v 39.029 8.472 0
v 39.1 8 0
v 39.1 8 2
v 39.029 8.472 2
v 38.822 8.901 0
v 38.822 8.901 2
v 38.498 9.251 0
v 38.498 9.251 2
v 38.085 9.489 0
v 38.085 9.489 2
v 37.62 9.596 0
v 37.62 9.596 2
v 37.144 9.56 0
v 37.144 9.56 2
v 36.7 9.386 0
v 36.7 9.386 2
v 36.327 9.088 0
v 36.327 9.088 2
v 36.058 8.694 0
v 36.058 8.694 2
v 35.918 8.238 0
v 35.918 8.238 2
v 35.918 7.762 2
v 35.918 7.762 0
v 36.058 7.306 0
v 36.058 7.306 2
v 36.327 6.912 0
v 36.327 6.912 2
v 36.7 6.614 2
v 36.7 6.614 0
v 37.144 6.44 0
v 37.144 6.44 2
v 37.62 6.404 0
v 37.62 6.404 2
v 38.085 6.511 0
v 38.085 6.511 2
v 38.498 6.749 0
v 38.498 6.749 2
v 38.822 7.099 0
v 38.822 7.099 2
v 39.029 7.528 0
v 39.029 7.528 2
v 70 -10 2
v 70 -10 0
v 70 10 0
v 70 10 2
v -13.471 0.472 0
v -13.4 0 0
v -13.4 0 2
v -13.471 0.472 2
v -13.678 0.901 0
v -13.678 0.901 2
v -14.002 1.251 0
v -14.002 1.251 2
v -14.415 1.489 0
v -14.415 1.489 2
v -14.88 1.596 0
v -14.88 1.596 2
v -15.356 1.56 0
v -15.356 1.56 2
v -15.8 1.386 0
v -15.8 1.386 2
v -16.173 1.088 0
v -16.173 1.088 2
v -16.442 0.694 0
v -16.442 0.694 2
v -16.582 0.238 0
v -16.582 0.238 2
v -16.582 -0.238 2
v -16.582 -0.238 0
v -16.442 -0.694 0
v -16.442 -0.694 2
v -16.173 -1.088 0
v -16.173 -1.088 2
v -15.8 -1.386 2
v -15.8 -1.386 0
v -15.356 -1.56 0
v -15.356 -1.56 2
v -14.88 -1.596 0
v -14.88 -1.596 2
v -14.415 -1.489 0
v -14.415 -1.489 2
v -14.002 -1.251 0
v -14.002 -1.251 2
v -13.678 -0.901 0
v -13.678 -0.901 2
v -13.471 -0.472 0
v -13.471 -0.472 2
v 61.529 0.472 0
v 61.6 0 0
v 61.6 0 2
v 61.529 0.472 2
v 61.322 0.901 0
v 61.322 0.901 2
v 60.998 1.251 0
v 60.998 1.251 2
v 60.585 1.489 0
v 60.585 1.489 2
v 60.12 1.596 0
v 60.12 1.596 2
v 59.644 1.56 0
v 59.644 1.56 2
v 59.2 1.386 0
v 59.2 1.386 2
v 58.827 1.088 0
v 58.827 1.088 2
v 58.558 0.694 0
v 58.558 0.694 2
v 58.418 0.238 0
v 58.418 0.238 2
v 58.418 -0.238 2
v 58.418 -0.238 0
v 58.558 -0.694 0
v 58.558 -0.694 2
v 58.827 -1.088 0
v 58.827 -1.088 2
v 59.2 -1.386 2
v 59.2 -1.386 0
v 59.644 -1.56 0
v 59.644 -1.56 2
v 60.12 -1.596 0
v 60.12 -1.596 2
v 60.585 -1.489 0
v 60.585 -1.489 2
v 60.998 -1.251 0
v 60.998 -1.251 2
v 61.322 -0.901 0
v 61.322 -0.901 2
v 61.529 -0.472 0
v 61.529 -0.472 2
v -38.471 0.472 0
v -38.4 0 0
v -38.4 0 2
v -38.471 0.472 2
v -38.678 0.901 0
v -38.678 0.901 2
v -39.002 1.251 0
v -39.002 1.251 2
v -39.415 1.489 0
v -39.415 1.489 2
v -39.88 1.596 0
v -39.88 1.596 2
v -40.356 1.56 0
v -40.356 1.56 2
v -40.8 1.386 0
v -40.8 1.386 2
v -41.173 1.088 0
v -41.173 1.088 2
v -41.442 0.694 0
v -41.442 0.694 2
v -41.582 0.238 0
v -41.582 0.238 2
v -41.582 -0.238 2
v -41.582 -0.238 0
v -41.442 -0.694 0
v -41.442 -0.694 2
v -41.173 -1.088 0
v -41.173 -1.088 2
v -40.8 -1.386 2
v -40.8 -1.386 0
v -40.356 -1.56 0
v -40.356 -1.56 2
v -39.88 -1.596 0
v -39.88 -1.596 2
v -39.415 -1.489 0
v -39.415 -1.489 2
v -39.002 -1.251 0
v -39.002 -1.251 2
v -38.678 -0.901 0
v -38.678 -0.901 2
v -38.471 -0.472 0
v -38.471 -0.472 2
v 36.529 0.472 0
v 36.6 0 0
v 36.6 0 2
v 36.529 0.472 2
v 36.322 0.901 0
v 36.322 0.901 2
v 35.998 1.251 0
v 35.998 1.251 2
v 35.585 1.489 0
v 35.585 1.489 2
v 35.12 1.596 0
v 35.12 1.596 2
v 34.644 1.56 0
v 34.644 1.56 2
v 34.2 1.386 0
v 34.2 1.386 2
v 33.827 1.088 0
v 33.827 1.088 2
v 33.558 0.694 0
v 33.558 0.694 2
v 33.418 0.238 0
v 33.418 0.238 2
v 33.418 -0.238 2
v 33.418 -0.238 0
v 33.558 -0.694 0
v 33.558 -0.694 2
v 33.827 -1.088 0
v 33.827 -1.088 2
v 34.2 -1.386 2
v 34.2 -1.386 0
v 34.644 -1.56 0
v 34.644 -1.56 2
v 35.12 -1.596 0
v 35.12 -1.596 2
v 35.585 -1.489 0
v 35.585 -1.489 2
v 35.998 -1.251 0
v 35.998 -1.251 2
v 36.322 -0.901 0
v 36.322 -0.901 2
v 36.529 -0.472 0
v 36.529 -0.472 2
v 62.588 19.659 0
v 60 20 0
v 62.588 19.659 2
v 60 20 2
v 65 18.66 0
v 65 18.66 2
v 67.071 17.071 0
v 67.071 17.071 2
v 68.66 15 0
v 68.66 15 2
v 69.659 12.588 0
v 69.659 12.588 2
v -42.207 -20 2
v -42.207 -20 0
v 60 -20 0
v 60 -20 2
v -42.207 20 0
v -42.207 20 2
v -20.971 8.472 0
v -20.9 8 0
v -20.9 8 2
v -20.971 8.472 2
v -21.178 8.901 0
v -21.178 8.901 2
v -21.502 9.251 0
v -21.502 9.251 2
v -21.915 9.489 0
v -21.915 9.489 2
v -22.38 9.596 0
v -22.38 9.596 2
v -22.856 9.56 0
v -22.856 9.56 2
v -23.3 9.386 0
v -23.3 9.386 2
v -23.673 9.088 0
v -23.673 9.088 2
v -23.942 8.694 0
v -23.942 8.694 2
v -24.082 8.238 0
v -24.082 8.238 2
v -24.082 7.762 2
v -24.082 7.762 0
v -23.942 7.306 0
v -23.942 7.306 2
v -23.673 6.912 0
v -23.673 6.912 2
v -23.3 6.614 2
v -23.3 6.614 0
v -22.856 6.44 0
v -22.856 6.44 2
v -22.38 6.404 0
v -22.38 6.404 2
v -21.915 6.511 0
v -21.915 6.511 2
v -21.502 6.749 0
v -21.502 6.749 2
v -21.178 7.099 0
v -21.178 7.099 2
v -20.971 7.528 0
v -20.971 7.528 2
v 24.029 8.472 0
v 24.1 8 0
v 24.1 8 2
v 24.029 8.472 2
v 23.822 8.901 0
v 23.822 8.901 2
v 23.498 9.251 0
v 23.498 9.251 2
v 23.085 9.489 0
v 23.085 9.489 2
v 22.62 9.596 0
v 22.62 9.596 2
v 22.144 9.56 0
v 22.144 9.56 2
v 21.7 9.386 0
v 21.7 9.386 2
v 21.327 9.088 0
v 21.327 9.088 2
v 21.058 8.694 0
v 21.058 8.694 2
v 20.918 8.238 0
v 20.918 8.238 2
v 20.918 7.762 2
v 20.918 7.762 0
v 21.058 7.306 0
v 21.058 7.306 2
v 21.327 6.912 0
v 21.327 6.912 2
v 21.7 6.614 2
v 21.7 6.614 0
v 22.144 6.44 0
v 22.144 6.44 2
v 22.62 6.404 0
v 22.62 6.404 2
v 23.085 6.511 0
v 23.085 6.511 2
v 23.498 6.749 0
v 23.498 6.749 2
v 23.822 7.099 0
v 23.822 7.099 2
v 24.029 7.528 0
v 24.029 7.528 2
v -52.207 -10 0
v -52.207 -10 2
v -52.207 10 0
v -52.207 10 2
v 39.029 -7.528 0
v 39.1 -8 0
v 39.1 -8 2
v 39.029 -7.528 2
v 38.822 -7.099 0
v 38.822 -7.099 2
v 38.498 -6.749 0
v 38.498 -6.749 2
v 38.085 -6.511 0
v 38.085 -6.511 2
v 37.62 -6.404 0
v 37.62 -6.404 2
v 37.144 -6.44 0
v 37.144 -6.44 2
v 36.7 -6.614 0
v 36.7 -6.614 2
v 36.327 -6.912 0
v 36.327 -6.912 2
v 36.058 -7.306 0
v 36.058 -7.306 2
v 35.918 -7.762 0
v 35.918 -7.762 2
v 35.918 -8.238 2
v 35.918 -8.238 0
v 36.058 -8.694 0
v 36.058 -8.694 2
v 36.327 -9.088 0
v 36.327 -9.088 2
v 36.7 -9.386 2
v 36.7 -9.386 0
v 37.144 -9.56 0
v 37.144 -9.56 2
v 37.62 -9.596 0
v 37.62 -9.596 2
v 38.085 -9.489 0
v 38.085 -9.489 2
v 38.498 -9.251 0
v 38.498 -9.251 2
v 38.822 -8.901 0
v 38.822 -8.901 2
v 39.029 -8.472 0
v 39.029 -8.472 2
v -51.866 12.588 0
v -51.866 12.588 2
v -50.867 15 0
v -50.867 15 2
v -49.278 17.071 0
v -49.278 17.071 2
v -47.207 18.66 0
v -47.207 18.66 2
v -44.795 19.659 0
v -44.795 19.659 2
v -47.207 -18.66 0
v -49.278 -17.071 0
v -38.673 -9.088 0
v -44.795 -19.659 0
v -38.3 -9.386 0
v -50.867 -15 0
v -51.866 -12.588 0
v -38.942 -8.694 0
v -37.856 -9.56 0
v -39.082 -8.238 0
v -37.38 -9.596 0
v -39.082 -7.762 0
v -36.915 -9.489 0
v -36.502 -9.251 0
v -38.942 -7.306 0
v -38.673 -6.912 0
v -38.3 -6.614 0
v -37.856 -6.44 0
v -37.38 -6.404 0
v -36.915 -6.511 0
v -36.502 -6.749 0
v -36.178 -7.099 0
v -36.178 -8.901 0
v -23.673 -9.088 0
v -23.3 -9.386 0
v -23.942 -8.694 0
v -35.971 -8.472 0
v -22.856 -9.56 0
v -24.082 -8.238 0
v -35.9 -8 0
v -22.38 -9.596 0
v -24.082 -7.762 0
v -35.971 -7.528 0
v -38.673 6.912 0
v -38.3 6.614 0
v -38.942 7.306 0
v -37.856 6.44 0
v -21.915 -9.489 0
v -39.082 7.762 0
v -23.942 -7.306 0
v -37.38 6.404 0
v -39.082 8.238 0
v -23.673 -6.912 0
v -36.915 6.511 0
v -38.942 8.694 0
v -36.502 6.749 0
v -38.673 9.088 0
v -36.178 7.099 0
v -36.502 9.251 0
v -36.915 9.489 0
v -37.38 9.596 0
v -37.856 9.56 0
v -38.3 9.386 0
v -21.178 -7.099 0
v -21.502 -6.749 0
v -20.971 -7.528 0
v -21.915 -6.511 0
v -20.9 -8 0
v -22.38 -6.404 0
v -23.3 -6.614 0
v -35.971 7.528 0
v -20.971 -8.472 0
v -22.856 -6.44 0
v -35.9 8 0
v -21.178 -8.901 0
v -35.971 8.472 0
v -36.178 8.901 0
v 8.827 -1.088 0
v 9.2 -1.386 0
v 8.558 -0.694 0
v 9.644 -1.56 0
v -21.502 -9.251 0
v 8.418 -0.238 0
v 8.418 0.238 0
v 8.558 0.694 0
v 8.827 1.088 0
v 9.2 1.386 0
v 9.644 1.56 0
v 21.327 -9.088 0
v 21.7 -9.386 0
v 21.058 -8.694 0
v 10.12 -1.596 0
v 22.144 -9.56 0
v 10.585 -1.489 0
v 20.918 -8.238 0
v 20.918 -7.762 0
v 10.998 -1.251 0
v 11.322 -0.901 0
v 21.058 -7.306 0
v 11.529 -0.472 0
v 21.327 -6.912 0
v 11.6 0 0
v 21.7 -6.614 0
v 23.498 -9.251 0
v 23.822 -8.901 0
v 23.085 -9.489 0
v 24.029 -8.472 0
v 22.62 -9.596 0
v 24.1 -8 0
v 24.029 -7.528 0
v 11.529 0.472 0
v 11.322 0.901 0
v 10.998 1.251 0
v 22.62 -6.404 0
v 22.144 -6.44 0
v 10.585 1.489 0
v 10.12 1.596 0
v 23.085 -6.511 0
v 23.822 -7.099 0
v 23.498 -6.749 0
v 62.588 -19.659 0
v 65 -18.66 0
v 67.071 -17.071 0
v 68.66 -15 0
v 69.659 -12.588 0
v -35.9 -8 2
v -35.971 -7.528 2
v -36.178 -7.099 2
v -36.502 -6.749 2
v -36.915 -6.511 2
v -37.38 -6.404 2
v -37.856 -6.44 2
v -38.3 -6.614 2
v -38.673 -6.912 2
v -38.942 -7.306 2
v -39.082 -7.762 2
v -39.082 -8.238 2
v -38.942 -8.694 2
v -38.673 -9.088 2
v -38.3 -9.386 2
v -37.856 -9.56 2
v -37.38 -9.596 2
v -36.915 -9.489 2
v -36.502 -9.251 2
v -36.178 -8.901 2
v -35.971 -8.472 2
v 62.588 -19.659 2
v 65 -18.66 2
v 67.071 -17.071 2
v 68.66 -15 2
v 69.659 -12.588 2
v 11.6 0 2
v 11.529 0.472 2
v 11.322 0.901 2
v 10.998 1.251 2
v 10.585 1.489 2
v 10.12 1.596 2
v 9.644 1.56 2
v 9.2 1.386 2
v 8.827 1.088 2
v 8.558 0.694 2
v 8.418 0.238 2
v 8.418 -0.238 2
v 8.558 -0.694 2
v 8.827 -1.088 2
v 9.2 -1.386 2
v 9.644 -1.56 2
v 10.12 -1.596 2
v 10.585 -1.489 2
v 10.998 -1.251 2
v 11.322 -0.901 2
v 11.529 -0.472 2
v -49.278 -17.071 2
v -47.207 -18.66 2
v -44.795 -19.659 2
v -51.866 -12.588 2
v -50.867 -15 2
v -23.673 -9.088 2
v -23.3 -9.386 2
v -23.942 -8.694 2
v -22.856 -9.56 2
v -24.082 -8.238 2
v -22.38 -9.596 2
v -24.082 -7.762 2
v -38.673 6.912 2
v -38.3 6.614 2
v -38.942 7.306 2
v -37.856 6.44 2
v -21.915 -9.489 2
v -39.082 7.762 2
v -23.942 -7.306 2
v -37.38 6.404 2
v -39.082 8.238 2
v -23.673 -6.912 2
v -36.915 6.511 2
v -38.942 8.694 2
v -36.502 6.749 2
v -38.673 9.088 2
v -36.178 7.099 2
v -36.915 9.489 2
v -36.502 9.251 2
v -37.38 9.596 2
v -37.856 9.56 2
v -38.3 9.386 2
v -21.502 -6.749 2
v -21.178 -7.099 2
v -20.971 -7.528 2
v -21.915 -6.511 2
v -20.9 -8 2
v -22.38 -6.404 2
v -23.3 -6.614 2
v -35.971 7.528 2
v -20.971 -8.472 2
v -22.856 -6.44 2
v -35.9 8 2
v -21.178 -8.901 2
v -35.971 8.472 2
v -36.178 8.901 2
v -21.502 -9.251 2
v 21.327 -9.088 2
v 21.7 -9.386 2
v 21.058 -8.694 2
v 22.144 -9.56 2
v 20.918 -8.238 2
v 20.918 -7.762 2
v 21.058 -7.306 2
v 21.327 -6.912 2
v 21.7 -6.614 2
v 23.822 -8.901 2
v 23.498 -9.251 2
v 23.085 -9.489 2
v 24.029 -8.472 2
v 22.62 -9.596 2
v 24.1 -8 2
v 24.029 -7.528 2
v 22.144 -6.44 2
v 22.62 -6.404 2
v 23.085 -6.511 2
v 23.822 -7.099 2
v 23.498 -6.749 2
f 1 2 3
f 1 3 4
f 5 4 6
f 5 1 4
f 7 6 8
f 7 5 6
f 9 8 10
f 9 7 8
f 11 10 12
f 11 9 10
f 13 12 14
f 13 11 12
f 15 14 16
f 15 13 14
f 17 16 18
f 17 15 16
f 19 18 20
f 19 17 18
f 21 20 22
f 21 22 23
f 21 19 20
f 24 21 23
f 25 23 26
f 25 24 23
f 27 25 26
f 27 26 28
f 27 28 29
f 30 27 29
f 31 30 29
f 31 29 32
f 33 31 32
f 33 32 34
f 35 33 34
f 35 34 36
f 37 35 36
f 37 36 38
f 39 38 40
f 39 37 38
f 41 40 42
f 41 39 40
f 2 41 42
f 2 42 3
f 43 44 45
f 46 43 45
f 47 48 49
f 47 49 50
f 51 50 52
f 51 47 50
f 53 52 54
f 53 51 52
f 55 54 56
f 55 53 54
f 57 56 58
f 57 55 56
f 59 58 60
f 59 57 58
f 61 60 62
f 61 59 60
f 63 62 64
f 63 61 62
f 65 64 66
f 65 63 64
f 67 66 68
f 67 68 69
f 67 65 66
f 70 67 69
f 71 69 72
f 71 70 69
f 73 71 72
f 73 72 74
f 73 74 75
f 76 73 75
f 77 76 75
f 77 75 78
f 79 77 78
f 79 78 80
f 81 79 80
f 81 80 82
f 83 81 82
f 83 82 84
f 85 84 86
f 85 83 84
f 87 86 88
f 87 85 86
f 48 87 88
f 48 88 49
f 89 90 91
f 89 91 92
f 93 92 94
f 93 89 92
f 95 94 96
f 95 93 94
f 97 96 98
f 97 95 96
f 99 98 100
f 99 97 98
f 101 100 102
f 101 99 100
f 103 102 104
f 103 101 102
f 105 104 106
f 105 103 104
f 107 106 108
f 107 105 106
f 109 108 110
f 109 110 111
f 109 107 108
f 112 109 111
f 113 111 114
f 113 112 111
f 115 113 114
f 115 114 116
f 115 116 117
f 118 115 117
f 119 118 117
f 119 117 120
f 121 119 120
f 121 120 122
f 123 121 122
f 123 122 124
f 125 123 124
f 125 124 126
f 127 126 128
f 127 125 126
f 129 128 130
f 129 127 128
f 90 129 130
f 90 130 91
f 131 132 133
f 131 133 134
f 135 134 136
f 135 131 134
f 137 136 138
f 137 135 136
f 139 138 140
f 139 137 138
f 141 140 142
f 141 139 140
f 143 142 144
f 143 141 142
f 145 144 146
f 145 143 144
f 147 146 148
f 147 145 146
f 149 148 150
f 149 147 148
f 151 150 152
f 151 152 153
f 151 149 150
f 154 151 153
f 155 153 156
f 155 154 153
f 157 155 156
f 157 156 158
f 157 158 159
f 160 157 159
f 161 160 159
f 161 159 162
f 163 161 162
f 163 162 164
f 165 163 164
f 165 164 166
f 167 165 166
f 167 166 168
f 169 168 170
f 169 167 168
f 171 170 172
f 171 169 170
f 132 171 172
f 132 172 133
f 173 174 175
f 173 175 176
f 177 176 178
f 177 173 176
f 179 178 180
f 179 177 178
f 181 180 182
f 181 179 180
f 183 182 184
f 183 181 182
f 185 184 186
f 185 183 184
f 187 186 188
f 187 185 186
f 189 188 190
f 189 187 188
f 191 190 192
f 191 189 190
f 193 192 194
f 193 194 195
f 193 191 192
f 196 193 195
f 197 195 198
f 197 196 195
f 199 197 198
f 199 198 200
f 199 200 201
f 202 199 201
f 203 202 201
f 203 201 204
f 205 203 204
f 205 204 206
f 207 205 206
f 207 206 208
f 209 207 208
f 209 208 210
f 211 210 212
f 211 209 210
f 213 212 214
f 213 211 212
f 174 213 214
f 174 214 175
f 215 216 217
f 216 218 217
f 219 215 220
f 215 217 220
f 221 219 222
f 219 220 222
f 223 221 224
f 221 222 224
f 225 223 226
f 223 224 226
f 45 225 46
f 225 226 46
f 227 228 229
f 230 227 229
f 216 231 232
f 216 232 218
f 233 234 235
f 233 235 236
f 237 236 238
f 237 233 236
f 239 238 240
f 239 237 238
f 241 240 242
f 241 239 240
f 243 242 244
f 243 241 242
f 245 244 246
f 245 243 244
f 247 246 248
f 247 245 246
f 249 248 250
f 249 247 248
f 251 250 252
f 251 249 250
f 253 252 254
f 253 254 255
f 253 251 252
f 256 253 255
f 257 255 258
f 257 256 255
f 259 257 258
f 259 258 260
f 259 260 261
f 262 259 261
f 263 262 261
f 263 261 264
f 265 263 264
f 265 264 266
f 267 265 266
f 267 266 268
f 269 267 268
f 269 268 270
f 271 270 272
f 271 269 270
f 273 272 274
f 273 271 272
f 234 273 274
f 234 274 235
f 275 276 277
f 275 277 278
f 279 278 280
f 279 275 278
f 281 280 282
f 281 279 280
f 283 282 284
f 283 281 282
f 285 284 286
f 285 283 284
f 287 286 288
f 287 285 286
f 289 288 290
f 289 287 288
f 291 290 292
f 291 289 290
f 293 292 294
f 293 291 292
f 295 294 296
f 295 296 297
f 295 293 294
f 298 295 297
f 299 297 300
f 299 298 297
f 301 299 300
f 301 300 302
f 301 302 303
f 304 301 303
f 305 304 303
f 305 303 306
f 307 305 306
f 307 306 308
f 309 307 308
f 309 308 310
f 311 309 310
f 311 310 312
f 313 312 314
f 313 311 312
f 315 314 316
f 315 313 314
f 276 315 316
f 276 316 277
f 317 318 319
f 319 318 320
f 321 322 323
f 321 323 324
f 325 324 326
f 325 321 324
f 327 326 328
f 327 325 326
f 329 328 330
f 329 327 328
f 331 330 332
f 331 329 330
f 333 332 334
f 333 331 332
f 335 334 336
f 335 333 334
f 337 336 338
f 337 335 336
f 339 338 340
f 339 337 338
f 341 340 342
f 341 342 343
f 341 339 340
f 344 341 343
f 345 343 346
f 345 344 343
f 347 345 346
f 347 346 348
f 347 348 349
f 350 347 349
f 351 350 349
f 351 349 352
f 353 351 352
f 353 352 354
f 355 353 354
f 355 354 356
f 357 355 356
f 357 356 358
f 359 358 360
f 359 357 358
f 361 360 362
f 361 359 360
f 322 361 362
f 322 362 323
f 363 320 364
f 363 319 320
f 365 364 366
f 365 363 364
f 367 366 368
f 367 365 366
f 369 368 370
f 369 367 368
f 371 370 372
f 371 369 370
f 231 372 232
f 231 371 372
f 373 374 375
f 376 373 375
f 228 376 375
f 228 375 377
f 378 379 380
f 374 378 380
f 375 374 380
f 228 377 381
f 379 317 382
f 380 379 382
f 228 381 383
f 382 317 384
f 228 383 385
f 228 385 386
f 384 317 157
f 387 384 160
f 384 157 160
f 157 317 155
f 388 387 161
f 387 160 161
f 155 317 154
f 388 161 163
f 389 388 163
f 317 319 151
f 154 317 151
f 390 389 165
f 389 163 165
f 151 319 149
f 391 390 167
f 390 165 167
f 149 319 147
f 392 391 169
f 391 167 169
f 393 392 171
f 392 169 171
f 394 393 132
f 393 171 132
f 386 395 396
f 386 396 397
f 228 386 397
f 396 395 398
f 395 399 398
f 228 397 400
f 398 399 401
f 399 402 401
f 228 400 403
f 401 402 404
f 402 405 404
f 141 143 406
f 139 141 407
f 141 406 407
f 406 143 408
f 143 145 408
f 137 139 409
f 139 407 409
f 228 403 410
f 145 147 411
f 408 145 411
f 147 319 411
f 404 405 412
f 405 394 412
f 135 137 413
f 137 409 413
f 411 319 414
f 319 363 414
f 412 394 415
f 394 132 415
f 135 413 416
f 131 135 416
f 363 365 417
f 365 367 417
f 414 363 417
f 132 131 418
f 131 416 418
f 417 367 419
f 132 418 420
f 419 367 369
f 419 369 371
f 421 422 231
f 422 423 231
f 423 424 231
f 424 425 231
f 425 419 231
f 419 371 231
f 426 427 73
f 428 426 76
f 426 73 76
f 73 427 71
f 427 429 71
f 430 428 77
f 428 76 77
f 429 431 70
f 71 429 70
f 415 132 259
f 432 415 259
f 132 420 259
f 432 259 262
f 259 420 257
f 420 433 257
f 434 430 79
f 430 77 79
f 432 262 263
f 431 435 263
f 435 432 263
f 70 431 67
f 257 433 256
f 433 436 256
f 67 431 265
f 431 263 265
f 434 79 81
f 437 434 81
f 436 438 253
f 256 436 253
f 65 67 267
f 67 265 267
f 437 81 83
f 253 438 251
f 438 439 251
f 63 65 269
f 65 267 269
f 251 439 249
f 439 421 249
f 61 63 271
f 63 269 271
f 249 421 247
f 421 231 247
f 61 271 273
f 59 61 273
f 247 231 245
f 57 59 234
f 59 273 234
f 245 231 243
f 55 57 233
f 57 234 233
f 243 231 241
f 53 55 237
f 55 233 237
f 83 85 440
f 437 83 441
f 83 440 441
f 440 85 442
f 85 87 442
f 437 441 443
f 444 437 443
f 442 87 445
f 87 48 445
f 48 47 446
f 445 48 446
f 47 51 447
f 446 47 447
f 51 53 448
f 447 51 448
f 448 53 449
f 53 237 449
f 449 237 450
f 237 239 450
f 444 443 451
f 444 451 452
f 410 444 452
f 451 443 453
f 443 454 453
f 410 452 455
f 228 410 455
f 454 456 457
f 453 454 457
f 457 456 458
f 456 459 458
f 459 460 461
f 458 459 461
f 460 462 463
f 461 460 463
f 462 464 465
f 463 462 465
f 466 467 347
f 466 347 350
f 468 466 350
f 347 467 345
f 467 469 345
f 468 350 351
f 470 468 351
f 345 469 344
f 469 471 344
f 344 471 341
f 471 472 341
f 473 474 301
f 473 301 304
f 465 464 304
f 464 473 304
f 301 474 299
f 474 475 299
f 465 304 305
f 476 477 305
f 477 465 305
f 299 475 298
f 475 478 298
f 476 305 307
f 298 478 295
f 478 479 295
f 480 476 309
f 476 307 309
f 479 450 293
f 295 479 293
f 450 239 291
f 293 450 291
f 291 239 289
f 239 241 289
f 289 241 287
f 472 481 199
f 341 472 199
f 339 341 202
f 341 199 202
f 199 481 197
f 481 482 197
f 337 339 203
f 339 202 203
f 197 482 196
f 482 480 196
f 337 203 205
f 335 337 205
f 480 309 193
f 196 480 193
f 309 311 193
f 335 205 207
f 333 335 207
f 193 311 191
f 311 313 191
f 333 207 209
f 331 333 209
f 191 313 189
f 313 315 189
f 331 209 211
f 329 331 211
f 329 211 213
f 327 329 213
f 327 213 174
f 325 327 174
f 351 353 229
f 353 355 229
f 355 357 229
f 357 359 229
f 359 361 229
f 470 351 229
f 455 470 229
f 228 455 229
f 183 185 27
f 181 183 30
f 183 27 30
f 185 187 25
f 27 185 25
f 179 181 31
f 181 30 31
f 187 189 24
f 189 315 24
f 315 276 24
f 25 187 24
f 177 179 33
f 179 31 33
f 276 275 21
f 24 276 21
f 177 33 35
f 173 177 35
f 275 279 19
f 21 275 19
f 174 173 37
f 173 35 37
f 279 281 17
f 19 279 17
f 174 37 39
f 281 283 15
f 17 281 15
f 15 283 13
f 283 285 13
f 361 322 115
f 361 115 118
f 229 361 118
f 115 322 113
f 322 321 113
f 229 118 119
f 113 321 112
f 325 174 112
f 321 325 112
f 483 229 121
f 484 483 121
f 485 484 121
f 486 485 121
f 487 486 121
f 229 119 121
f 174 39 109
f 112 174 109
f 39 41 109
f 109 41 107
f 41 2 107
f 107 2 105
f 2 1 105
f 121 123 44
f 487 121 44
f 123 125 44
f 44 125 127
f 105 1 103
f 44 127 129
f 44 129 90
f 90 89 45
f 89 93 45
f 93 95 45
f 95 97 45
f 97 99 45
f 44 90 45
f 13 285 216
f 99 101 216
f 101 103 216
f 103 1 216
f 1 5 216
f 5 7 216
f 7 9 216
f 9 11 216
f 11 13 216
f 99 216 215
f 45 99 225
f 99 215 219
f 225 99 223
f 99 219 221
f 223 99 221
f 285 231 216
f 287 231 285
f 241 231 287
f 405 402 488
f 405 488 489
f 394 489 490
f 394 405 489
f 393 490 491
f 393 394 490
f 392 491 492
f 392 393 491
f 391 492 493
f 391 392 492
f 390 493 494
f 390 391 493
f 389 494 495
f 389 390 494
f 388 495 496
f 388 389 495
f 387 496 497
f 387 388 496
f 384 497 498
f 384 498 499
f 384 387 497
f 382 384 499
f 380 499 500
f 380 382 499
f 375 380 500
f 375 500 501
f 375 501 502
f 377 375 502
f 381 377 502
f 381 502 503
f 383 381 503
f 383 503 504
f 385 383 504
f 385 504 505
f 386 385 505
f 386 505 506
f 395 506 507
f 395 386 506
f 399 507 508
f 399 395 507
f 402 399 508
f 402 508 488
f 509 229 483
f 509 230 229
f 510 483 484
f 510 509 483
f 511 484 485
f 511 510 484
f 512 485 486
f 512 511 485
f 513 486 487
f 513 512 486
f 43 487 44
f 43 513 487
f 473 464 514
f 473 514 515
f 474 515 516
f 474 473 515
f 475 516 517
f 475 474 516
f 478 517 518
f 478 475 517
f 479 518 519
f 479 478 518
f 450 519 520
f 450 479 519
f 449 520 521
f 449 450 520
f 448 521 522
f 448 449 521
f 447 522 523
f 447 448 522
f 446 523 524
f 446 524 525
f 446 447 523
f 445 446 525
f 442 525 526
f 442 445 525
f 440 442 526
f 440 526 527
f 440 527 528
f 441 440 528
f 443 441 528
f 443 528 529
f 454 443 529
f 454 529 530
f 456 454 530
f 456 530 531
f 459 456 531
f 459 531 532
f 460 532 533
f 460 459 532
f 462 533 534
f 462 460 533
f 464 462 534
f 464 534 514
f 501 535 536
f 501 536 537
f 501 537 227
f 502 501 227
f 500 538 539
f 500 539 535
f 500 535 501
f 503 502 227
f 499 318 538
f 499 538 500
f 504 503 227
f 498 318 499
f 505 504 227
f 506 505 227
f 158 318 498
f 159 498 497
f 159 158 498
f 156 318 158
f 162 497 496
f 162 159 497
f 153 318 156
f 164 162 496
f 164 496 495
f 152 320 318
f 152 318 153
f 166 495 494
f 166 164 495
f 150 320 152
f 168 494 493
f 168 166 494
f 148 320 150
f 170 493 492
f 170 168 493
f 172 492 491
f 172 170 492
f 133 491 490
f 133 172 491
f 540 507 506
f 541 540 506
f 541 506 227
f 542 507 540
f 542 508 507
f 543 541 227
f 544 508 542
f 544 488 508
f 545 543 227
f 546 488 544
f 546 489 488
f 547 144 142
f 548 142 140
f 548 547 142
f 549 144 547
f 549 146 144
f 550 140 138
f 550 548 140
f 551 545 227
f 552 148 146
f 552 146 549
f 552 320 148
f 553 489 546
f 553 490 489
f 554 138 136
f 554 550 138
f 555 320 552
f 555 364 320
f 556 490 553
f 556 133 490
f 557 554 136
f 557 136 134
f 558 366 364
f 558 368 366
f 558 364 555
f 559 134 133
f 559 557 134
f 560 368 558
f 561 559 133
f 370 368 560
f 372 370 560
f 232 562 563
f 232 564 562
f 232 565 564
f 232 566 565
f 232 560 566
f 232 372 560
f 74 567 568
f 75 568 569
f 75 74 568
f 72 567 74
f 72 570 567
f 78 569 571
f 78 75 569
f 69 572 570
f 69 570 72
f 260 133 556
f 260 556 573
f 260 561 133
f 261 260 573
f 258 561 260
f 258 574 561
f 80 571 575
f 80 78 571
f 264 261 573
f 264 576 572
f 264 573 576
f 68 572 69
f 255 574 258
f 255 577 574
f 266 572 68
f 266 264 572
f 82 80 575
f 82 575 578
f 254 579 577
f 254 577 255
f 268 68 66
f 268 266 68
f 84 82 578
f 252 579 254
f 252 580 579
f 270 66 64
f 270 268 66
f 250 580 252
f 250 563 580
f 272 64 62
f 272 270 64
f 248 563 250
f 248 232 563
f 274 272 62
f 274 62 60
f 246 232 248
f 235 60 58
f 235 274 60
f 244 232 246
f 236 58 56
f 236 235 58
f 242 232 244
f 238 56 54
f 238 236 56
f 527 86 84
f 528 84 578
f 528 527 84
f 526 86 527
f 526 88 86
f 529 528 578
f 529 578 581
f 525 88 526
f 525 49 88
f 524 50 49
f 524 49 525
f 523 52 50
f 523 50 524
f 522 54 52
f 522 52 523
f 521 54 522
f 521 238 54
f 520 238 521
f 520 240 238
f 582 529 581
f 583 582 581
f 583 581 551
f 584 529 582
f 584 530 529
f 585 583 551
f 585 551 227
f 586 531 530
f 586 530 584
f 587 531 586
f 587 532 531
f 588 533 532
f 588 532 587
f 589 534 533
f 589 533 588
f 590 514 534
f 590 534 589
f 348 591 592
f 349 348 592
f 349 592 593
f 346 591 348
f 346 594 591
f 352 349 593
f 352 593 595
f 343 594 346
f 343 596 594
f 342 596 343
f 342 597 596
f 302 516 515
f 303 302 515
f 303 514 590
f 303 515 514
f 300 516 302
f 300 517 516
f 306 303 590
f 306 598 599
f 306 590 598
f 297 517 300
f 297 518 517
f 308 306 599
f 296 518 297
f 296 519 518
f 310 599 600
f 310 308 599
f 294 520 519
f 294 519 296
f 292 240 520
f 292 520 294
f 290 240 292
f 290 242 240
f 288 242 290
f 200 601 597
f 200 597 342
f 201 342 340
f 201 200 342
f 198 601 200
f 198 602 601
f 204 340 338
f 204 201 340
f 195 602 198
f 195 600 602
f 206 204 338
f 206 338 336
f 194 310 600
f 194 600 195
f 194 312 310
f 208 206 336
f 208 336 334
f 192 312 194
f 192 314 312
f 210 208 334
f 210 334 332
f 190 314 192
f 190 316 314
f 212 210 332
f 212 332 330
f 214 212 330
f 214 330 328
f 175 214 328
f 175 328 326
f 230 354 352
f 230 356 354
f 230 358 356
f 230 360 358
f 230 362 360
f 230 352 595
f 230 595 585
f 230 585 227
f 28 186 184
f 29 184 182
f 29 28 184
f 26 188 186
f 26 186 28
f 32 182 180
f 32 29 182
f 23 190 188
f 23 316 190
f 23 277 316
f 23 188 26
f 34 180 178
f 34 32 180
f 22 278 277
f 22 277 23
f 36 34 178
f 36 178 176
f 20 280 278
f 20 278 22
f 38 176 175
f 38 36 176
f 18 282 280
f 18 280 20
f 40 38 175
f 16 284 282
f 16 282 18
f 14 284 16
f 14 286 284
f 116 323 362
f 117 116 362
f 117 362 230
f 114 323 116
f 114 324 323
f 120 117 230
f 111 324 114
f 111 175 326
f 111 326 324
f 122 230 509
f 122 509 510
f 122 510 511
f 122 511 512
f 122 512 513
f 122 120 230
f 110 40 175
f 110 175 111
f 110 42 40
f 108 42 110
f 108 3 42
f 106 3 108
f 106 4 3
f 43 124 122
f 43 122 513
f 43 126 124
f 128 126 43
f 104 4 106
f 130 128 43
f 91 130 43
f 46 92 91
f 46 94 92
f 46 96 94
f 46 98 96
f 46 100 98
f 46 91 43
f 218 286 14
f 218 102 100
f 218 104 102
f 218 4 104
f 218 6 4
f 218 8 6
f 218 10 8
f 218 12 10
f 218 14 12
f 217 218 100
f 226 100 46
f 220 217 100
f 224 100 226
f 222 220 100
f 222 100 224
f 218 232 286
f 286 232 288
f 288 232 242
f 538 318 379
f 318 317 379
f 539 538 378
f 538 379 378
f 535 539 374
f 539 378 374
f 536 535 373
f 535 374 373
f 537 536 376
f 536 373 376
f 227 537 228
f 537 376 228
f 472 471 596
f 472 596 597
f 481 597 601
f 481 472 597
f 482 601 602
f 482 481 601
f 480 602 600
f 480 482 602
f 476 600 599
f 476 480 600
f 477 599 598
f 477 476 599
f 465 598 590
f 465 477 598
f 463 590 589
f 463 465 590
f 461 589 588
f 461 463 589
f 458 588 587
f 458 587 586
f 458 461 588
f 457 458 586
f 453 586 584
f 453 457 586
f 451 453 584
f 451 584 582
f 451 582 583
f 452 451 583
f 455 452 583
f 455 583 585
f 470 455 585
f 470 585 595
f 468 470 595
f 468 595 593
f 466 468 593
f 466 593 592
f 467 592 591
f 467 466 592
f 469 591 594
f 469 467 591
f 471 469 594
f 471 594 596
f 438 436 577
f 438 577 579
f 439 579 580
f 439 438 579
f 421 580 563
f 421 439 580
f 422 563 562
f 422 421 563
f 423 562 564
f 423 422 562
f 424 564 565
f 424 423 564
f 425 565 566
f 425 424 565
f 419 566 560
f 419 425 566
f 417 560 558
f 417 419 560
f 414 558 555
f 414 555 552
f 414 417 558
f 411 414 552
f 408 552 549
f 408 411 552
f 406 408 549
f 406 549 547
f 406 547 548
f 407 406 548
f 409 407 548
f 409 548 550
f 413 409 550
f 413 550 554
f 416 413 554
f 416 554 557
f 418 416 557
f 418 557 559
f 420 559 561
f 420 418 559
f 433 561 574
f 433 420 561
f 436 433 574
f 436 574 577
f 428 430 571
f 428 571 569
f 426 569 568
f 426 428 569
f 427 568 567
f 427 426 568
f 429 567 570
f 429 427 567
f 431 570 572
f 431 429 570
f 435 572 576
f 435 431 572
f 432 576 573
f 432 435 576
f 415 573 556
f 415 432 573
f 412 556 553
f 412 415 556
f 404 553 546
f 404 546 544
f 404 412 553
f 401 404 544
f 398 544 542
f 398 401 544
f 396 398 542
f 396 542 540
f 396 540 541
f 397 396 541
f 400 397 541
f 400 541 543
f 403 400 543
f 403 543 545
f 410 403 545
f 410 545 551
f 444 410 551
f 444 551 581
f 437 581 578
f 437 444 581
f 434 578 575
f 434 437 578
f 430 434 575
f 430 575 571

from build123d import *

# Parameters (mm, degrees)
SKETCH_1_W          = 140
SKETCH_1_H          = 40
SKETCH_1_R          = 1.6
EXTRUDE_1_DEPTH     = 2
FILLET_1_R          = 10
SKETCH_2_W          = 24.439336454
SKETCH_2_H          = 40
CUT_EXTRUDE_1_DEPTH = 10
FILLET_2_R          = 10


with BuildPart() as part:
    # 草图1 → 凸台-拉伸1 (new body)
    with BuildSketch(Plane.XY):
        Rectangle(SKETCH_1_W, SKETCH_1_H)
        with Locations((37.5, 8)):
            Circle(SKETCH_1_R, mode=Mode.SUBTRACT)
        with Locations((37.5, -8)):
            Circle(SKETCH_1_R, mode=Mode.SUBTRACT)
        with Locations((22.5, -8)):
            Circle(SKETCH_1_R, mode=Mode.SUBTRACT)
        with Locations((22.5, 8)):
            Circle(SKETCH_1_R, mode=Mode.SUBTRACT)
        with Locations((-22.5, -8)):
            Circle(SKETCH_1_R, mode=Mode.SUBTRACT)
        with Locations((-37.5, -8)):
            Circle(SKETCH_1_R, mode=Mode.SUBTRACT)
        with Locations((-22.5, 8)):
            Circle(SKETCH_1_R, mode=Mode.SUBTRACT)
        with Locations((-37.5, 8)):
            Circle(SKETCH_1_R, mode=Mode.SUBTRACT)
        with Locations((60, 0)):
            Circle(SKETCH_1_R, mode=Mode.SUBTRACT)
        with Locations((35, 0)):
            Circle(SKETCH_1_R, mode=Mode.SUBTRACT)
        with Locations((10, 0)):
            Circle(SKETCH_1_R, mode=Mode.SUBTRACT)
        with Locations((-15, 0)):
            Circle(SKETCH_1_R, mode=Mode.SUBTRACT)
        with Locations((-40, 0)):
            Circle(SKETCH_1_R, mode=Mode.SUBTRACT)
    extrude(amount=EXTRUDE_1_DEPTH)

    # 圆角1
    fillet_1_edges = [part.edges().sort_by_distance(p)[0] for p in [
        (70, -20, 1),
        (-70, -20, 1),
        (-70, 20, 1),
        (70, 20, 1),
    ]]
    fillet(fillet_1_edges, radius=FILLET_1_R)

    # 草图2 → 切除-拉伸1 (cut)
    with BuildSketch(Plane.XY.offset(2)):
        with Locations((-64.426426614, 0)):
            Rectangle(SKETCH_2_W, SKETCH_2_H)
    extrude(amount=-CUT_EXTRUDE_1_DEPTH, mode=Mode.SUBTRACT)

    # 圆角2
    fillet_2_edges = [part.edges().sort_by_distance(p)[0] for p in [
        (-52.206758387, 20, 1),
        (-52.206758387, -20, 1),
    ]]
    fillet(fillet_2_edges, radius=FILLET_2_R)


solid = part.part
